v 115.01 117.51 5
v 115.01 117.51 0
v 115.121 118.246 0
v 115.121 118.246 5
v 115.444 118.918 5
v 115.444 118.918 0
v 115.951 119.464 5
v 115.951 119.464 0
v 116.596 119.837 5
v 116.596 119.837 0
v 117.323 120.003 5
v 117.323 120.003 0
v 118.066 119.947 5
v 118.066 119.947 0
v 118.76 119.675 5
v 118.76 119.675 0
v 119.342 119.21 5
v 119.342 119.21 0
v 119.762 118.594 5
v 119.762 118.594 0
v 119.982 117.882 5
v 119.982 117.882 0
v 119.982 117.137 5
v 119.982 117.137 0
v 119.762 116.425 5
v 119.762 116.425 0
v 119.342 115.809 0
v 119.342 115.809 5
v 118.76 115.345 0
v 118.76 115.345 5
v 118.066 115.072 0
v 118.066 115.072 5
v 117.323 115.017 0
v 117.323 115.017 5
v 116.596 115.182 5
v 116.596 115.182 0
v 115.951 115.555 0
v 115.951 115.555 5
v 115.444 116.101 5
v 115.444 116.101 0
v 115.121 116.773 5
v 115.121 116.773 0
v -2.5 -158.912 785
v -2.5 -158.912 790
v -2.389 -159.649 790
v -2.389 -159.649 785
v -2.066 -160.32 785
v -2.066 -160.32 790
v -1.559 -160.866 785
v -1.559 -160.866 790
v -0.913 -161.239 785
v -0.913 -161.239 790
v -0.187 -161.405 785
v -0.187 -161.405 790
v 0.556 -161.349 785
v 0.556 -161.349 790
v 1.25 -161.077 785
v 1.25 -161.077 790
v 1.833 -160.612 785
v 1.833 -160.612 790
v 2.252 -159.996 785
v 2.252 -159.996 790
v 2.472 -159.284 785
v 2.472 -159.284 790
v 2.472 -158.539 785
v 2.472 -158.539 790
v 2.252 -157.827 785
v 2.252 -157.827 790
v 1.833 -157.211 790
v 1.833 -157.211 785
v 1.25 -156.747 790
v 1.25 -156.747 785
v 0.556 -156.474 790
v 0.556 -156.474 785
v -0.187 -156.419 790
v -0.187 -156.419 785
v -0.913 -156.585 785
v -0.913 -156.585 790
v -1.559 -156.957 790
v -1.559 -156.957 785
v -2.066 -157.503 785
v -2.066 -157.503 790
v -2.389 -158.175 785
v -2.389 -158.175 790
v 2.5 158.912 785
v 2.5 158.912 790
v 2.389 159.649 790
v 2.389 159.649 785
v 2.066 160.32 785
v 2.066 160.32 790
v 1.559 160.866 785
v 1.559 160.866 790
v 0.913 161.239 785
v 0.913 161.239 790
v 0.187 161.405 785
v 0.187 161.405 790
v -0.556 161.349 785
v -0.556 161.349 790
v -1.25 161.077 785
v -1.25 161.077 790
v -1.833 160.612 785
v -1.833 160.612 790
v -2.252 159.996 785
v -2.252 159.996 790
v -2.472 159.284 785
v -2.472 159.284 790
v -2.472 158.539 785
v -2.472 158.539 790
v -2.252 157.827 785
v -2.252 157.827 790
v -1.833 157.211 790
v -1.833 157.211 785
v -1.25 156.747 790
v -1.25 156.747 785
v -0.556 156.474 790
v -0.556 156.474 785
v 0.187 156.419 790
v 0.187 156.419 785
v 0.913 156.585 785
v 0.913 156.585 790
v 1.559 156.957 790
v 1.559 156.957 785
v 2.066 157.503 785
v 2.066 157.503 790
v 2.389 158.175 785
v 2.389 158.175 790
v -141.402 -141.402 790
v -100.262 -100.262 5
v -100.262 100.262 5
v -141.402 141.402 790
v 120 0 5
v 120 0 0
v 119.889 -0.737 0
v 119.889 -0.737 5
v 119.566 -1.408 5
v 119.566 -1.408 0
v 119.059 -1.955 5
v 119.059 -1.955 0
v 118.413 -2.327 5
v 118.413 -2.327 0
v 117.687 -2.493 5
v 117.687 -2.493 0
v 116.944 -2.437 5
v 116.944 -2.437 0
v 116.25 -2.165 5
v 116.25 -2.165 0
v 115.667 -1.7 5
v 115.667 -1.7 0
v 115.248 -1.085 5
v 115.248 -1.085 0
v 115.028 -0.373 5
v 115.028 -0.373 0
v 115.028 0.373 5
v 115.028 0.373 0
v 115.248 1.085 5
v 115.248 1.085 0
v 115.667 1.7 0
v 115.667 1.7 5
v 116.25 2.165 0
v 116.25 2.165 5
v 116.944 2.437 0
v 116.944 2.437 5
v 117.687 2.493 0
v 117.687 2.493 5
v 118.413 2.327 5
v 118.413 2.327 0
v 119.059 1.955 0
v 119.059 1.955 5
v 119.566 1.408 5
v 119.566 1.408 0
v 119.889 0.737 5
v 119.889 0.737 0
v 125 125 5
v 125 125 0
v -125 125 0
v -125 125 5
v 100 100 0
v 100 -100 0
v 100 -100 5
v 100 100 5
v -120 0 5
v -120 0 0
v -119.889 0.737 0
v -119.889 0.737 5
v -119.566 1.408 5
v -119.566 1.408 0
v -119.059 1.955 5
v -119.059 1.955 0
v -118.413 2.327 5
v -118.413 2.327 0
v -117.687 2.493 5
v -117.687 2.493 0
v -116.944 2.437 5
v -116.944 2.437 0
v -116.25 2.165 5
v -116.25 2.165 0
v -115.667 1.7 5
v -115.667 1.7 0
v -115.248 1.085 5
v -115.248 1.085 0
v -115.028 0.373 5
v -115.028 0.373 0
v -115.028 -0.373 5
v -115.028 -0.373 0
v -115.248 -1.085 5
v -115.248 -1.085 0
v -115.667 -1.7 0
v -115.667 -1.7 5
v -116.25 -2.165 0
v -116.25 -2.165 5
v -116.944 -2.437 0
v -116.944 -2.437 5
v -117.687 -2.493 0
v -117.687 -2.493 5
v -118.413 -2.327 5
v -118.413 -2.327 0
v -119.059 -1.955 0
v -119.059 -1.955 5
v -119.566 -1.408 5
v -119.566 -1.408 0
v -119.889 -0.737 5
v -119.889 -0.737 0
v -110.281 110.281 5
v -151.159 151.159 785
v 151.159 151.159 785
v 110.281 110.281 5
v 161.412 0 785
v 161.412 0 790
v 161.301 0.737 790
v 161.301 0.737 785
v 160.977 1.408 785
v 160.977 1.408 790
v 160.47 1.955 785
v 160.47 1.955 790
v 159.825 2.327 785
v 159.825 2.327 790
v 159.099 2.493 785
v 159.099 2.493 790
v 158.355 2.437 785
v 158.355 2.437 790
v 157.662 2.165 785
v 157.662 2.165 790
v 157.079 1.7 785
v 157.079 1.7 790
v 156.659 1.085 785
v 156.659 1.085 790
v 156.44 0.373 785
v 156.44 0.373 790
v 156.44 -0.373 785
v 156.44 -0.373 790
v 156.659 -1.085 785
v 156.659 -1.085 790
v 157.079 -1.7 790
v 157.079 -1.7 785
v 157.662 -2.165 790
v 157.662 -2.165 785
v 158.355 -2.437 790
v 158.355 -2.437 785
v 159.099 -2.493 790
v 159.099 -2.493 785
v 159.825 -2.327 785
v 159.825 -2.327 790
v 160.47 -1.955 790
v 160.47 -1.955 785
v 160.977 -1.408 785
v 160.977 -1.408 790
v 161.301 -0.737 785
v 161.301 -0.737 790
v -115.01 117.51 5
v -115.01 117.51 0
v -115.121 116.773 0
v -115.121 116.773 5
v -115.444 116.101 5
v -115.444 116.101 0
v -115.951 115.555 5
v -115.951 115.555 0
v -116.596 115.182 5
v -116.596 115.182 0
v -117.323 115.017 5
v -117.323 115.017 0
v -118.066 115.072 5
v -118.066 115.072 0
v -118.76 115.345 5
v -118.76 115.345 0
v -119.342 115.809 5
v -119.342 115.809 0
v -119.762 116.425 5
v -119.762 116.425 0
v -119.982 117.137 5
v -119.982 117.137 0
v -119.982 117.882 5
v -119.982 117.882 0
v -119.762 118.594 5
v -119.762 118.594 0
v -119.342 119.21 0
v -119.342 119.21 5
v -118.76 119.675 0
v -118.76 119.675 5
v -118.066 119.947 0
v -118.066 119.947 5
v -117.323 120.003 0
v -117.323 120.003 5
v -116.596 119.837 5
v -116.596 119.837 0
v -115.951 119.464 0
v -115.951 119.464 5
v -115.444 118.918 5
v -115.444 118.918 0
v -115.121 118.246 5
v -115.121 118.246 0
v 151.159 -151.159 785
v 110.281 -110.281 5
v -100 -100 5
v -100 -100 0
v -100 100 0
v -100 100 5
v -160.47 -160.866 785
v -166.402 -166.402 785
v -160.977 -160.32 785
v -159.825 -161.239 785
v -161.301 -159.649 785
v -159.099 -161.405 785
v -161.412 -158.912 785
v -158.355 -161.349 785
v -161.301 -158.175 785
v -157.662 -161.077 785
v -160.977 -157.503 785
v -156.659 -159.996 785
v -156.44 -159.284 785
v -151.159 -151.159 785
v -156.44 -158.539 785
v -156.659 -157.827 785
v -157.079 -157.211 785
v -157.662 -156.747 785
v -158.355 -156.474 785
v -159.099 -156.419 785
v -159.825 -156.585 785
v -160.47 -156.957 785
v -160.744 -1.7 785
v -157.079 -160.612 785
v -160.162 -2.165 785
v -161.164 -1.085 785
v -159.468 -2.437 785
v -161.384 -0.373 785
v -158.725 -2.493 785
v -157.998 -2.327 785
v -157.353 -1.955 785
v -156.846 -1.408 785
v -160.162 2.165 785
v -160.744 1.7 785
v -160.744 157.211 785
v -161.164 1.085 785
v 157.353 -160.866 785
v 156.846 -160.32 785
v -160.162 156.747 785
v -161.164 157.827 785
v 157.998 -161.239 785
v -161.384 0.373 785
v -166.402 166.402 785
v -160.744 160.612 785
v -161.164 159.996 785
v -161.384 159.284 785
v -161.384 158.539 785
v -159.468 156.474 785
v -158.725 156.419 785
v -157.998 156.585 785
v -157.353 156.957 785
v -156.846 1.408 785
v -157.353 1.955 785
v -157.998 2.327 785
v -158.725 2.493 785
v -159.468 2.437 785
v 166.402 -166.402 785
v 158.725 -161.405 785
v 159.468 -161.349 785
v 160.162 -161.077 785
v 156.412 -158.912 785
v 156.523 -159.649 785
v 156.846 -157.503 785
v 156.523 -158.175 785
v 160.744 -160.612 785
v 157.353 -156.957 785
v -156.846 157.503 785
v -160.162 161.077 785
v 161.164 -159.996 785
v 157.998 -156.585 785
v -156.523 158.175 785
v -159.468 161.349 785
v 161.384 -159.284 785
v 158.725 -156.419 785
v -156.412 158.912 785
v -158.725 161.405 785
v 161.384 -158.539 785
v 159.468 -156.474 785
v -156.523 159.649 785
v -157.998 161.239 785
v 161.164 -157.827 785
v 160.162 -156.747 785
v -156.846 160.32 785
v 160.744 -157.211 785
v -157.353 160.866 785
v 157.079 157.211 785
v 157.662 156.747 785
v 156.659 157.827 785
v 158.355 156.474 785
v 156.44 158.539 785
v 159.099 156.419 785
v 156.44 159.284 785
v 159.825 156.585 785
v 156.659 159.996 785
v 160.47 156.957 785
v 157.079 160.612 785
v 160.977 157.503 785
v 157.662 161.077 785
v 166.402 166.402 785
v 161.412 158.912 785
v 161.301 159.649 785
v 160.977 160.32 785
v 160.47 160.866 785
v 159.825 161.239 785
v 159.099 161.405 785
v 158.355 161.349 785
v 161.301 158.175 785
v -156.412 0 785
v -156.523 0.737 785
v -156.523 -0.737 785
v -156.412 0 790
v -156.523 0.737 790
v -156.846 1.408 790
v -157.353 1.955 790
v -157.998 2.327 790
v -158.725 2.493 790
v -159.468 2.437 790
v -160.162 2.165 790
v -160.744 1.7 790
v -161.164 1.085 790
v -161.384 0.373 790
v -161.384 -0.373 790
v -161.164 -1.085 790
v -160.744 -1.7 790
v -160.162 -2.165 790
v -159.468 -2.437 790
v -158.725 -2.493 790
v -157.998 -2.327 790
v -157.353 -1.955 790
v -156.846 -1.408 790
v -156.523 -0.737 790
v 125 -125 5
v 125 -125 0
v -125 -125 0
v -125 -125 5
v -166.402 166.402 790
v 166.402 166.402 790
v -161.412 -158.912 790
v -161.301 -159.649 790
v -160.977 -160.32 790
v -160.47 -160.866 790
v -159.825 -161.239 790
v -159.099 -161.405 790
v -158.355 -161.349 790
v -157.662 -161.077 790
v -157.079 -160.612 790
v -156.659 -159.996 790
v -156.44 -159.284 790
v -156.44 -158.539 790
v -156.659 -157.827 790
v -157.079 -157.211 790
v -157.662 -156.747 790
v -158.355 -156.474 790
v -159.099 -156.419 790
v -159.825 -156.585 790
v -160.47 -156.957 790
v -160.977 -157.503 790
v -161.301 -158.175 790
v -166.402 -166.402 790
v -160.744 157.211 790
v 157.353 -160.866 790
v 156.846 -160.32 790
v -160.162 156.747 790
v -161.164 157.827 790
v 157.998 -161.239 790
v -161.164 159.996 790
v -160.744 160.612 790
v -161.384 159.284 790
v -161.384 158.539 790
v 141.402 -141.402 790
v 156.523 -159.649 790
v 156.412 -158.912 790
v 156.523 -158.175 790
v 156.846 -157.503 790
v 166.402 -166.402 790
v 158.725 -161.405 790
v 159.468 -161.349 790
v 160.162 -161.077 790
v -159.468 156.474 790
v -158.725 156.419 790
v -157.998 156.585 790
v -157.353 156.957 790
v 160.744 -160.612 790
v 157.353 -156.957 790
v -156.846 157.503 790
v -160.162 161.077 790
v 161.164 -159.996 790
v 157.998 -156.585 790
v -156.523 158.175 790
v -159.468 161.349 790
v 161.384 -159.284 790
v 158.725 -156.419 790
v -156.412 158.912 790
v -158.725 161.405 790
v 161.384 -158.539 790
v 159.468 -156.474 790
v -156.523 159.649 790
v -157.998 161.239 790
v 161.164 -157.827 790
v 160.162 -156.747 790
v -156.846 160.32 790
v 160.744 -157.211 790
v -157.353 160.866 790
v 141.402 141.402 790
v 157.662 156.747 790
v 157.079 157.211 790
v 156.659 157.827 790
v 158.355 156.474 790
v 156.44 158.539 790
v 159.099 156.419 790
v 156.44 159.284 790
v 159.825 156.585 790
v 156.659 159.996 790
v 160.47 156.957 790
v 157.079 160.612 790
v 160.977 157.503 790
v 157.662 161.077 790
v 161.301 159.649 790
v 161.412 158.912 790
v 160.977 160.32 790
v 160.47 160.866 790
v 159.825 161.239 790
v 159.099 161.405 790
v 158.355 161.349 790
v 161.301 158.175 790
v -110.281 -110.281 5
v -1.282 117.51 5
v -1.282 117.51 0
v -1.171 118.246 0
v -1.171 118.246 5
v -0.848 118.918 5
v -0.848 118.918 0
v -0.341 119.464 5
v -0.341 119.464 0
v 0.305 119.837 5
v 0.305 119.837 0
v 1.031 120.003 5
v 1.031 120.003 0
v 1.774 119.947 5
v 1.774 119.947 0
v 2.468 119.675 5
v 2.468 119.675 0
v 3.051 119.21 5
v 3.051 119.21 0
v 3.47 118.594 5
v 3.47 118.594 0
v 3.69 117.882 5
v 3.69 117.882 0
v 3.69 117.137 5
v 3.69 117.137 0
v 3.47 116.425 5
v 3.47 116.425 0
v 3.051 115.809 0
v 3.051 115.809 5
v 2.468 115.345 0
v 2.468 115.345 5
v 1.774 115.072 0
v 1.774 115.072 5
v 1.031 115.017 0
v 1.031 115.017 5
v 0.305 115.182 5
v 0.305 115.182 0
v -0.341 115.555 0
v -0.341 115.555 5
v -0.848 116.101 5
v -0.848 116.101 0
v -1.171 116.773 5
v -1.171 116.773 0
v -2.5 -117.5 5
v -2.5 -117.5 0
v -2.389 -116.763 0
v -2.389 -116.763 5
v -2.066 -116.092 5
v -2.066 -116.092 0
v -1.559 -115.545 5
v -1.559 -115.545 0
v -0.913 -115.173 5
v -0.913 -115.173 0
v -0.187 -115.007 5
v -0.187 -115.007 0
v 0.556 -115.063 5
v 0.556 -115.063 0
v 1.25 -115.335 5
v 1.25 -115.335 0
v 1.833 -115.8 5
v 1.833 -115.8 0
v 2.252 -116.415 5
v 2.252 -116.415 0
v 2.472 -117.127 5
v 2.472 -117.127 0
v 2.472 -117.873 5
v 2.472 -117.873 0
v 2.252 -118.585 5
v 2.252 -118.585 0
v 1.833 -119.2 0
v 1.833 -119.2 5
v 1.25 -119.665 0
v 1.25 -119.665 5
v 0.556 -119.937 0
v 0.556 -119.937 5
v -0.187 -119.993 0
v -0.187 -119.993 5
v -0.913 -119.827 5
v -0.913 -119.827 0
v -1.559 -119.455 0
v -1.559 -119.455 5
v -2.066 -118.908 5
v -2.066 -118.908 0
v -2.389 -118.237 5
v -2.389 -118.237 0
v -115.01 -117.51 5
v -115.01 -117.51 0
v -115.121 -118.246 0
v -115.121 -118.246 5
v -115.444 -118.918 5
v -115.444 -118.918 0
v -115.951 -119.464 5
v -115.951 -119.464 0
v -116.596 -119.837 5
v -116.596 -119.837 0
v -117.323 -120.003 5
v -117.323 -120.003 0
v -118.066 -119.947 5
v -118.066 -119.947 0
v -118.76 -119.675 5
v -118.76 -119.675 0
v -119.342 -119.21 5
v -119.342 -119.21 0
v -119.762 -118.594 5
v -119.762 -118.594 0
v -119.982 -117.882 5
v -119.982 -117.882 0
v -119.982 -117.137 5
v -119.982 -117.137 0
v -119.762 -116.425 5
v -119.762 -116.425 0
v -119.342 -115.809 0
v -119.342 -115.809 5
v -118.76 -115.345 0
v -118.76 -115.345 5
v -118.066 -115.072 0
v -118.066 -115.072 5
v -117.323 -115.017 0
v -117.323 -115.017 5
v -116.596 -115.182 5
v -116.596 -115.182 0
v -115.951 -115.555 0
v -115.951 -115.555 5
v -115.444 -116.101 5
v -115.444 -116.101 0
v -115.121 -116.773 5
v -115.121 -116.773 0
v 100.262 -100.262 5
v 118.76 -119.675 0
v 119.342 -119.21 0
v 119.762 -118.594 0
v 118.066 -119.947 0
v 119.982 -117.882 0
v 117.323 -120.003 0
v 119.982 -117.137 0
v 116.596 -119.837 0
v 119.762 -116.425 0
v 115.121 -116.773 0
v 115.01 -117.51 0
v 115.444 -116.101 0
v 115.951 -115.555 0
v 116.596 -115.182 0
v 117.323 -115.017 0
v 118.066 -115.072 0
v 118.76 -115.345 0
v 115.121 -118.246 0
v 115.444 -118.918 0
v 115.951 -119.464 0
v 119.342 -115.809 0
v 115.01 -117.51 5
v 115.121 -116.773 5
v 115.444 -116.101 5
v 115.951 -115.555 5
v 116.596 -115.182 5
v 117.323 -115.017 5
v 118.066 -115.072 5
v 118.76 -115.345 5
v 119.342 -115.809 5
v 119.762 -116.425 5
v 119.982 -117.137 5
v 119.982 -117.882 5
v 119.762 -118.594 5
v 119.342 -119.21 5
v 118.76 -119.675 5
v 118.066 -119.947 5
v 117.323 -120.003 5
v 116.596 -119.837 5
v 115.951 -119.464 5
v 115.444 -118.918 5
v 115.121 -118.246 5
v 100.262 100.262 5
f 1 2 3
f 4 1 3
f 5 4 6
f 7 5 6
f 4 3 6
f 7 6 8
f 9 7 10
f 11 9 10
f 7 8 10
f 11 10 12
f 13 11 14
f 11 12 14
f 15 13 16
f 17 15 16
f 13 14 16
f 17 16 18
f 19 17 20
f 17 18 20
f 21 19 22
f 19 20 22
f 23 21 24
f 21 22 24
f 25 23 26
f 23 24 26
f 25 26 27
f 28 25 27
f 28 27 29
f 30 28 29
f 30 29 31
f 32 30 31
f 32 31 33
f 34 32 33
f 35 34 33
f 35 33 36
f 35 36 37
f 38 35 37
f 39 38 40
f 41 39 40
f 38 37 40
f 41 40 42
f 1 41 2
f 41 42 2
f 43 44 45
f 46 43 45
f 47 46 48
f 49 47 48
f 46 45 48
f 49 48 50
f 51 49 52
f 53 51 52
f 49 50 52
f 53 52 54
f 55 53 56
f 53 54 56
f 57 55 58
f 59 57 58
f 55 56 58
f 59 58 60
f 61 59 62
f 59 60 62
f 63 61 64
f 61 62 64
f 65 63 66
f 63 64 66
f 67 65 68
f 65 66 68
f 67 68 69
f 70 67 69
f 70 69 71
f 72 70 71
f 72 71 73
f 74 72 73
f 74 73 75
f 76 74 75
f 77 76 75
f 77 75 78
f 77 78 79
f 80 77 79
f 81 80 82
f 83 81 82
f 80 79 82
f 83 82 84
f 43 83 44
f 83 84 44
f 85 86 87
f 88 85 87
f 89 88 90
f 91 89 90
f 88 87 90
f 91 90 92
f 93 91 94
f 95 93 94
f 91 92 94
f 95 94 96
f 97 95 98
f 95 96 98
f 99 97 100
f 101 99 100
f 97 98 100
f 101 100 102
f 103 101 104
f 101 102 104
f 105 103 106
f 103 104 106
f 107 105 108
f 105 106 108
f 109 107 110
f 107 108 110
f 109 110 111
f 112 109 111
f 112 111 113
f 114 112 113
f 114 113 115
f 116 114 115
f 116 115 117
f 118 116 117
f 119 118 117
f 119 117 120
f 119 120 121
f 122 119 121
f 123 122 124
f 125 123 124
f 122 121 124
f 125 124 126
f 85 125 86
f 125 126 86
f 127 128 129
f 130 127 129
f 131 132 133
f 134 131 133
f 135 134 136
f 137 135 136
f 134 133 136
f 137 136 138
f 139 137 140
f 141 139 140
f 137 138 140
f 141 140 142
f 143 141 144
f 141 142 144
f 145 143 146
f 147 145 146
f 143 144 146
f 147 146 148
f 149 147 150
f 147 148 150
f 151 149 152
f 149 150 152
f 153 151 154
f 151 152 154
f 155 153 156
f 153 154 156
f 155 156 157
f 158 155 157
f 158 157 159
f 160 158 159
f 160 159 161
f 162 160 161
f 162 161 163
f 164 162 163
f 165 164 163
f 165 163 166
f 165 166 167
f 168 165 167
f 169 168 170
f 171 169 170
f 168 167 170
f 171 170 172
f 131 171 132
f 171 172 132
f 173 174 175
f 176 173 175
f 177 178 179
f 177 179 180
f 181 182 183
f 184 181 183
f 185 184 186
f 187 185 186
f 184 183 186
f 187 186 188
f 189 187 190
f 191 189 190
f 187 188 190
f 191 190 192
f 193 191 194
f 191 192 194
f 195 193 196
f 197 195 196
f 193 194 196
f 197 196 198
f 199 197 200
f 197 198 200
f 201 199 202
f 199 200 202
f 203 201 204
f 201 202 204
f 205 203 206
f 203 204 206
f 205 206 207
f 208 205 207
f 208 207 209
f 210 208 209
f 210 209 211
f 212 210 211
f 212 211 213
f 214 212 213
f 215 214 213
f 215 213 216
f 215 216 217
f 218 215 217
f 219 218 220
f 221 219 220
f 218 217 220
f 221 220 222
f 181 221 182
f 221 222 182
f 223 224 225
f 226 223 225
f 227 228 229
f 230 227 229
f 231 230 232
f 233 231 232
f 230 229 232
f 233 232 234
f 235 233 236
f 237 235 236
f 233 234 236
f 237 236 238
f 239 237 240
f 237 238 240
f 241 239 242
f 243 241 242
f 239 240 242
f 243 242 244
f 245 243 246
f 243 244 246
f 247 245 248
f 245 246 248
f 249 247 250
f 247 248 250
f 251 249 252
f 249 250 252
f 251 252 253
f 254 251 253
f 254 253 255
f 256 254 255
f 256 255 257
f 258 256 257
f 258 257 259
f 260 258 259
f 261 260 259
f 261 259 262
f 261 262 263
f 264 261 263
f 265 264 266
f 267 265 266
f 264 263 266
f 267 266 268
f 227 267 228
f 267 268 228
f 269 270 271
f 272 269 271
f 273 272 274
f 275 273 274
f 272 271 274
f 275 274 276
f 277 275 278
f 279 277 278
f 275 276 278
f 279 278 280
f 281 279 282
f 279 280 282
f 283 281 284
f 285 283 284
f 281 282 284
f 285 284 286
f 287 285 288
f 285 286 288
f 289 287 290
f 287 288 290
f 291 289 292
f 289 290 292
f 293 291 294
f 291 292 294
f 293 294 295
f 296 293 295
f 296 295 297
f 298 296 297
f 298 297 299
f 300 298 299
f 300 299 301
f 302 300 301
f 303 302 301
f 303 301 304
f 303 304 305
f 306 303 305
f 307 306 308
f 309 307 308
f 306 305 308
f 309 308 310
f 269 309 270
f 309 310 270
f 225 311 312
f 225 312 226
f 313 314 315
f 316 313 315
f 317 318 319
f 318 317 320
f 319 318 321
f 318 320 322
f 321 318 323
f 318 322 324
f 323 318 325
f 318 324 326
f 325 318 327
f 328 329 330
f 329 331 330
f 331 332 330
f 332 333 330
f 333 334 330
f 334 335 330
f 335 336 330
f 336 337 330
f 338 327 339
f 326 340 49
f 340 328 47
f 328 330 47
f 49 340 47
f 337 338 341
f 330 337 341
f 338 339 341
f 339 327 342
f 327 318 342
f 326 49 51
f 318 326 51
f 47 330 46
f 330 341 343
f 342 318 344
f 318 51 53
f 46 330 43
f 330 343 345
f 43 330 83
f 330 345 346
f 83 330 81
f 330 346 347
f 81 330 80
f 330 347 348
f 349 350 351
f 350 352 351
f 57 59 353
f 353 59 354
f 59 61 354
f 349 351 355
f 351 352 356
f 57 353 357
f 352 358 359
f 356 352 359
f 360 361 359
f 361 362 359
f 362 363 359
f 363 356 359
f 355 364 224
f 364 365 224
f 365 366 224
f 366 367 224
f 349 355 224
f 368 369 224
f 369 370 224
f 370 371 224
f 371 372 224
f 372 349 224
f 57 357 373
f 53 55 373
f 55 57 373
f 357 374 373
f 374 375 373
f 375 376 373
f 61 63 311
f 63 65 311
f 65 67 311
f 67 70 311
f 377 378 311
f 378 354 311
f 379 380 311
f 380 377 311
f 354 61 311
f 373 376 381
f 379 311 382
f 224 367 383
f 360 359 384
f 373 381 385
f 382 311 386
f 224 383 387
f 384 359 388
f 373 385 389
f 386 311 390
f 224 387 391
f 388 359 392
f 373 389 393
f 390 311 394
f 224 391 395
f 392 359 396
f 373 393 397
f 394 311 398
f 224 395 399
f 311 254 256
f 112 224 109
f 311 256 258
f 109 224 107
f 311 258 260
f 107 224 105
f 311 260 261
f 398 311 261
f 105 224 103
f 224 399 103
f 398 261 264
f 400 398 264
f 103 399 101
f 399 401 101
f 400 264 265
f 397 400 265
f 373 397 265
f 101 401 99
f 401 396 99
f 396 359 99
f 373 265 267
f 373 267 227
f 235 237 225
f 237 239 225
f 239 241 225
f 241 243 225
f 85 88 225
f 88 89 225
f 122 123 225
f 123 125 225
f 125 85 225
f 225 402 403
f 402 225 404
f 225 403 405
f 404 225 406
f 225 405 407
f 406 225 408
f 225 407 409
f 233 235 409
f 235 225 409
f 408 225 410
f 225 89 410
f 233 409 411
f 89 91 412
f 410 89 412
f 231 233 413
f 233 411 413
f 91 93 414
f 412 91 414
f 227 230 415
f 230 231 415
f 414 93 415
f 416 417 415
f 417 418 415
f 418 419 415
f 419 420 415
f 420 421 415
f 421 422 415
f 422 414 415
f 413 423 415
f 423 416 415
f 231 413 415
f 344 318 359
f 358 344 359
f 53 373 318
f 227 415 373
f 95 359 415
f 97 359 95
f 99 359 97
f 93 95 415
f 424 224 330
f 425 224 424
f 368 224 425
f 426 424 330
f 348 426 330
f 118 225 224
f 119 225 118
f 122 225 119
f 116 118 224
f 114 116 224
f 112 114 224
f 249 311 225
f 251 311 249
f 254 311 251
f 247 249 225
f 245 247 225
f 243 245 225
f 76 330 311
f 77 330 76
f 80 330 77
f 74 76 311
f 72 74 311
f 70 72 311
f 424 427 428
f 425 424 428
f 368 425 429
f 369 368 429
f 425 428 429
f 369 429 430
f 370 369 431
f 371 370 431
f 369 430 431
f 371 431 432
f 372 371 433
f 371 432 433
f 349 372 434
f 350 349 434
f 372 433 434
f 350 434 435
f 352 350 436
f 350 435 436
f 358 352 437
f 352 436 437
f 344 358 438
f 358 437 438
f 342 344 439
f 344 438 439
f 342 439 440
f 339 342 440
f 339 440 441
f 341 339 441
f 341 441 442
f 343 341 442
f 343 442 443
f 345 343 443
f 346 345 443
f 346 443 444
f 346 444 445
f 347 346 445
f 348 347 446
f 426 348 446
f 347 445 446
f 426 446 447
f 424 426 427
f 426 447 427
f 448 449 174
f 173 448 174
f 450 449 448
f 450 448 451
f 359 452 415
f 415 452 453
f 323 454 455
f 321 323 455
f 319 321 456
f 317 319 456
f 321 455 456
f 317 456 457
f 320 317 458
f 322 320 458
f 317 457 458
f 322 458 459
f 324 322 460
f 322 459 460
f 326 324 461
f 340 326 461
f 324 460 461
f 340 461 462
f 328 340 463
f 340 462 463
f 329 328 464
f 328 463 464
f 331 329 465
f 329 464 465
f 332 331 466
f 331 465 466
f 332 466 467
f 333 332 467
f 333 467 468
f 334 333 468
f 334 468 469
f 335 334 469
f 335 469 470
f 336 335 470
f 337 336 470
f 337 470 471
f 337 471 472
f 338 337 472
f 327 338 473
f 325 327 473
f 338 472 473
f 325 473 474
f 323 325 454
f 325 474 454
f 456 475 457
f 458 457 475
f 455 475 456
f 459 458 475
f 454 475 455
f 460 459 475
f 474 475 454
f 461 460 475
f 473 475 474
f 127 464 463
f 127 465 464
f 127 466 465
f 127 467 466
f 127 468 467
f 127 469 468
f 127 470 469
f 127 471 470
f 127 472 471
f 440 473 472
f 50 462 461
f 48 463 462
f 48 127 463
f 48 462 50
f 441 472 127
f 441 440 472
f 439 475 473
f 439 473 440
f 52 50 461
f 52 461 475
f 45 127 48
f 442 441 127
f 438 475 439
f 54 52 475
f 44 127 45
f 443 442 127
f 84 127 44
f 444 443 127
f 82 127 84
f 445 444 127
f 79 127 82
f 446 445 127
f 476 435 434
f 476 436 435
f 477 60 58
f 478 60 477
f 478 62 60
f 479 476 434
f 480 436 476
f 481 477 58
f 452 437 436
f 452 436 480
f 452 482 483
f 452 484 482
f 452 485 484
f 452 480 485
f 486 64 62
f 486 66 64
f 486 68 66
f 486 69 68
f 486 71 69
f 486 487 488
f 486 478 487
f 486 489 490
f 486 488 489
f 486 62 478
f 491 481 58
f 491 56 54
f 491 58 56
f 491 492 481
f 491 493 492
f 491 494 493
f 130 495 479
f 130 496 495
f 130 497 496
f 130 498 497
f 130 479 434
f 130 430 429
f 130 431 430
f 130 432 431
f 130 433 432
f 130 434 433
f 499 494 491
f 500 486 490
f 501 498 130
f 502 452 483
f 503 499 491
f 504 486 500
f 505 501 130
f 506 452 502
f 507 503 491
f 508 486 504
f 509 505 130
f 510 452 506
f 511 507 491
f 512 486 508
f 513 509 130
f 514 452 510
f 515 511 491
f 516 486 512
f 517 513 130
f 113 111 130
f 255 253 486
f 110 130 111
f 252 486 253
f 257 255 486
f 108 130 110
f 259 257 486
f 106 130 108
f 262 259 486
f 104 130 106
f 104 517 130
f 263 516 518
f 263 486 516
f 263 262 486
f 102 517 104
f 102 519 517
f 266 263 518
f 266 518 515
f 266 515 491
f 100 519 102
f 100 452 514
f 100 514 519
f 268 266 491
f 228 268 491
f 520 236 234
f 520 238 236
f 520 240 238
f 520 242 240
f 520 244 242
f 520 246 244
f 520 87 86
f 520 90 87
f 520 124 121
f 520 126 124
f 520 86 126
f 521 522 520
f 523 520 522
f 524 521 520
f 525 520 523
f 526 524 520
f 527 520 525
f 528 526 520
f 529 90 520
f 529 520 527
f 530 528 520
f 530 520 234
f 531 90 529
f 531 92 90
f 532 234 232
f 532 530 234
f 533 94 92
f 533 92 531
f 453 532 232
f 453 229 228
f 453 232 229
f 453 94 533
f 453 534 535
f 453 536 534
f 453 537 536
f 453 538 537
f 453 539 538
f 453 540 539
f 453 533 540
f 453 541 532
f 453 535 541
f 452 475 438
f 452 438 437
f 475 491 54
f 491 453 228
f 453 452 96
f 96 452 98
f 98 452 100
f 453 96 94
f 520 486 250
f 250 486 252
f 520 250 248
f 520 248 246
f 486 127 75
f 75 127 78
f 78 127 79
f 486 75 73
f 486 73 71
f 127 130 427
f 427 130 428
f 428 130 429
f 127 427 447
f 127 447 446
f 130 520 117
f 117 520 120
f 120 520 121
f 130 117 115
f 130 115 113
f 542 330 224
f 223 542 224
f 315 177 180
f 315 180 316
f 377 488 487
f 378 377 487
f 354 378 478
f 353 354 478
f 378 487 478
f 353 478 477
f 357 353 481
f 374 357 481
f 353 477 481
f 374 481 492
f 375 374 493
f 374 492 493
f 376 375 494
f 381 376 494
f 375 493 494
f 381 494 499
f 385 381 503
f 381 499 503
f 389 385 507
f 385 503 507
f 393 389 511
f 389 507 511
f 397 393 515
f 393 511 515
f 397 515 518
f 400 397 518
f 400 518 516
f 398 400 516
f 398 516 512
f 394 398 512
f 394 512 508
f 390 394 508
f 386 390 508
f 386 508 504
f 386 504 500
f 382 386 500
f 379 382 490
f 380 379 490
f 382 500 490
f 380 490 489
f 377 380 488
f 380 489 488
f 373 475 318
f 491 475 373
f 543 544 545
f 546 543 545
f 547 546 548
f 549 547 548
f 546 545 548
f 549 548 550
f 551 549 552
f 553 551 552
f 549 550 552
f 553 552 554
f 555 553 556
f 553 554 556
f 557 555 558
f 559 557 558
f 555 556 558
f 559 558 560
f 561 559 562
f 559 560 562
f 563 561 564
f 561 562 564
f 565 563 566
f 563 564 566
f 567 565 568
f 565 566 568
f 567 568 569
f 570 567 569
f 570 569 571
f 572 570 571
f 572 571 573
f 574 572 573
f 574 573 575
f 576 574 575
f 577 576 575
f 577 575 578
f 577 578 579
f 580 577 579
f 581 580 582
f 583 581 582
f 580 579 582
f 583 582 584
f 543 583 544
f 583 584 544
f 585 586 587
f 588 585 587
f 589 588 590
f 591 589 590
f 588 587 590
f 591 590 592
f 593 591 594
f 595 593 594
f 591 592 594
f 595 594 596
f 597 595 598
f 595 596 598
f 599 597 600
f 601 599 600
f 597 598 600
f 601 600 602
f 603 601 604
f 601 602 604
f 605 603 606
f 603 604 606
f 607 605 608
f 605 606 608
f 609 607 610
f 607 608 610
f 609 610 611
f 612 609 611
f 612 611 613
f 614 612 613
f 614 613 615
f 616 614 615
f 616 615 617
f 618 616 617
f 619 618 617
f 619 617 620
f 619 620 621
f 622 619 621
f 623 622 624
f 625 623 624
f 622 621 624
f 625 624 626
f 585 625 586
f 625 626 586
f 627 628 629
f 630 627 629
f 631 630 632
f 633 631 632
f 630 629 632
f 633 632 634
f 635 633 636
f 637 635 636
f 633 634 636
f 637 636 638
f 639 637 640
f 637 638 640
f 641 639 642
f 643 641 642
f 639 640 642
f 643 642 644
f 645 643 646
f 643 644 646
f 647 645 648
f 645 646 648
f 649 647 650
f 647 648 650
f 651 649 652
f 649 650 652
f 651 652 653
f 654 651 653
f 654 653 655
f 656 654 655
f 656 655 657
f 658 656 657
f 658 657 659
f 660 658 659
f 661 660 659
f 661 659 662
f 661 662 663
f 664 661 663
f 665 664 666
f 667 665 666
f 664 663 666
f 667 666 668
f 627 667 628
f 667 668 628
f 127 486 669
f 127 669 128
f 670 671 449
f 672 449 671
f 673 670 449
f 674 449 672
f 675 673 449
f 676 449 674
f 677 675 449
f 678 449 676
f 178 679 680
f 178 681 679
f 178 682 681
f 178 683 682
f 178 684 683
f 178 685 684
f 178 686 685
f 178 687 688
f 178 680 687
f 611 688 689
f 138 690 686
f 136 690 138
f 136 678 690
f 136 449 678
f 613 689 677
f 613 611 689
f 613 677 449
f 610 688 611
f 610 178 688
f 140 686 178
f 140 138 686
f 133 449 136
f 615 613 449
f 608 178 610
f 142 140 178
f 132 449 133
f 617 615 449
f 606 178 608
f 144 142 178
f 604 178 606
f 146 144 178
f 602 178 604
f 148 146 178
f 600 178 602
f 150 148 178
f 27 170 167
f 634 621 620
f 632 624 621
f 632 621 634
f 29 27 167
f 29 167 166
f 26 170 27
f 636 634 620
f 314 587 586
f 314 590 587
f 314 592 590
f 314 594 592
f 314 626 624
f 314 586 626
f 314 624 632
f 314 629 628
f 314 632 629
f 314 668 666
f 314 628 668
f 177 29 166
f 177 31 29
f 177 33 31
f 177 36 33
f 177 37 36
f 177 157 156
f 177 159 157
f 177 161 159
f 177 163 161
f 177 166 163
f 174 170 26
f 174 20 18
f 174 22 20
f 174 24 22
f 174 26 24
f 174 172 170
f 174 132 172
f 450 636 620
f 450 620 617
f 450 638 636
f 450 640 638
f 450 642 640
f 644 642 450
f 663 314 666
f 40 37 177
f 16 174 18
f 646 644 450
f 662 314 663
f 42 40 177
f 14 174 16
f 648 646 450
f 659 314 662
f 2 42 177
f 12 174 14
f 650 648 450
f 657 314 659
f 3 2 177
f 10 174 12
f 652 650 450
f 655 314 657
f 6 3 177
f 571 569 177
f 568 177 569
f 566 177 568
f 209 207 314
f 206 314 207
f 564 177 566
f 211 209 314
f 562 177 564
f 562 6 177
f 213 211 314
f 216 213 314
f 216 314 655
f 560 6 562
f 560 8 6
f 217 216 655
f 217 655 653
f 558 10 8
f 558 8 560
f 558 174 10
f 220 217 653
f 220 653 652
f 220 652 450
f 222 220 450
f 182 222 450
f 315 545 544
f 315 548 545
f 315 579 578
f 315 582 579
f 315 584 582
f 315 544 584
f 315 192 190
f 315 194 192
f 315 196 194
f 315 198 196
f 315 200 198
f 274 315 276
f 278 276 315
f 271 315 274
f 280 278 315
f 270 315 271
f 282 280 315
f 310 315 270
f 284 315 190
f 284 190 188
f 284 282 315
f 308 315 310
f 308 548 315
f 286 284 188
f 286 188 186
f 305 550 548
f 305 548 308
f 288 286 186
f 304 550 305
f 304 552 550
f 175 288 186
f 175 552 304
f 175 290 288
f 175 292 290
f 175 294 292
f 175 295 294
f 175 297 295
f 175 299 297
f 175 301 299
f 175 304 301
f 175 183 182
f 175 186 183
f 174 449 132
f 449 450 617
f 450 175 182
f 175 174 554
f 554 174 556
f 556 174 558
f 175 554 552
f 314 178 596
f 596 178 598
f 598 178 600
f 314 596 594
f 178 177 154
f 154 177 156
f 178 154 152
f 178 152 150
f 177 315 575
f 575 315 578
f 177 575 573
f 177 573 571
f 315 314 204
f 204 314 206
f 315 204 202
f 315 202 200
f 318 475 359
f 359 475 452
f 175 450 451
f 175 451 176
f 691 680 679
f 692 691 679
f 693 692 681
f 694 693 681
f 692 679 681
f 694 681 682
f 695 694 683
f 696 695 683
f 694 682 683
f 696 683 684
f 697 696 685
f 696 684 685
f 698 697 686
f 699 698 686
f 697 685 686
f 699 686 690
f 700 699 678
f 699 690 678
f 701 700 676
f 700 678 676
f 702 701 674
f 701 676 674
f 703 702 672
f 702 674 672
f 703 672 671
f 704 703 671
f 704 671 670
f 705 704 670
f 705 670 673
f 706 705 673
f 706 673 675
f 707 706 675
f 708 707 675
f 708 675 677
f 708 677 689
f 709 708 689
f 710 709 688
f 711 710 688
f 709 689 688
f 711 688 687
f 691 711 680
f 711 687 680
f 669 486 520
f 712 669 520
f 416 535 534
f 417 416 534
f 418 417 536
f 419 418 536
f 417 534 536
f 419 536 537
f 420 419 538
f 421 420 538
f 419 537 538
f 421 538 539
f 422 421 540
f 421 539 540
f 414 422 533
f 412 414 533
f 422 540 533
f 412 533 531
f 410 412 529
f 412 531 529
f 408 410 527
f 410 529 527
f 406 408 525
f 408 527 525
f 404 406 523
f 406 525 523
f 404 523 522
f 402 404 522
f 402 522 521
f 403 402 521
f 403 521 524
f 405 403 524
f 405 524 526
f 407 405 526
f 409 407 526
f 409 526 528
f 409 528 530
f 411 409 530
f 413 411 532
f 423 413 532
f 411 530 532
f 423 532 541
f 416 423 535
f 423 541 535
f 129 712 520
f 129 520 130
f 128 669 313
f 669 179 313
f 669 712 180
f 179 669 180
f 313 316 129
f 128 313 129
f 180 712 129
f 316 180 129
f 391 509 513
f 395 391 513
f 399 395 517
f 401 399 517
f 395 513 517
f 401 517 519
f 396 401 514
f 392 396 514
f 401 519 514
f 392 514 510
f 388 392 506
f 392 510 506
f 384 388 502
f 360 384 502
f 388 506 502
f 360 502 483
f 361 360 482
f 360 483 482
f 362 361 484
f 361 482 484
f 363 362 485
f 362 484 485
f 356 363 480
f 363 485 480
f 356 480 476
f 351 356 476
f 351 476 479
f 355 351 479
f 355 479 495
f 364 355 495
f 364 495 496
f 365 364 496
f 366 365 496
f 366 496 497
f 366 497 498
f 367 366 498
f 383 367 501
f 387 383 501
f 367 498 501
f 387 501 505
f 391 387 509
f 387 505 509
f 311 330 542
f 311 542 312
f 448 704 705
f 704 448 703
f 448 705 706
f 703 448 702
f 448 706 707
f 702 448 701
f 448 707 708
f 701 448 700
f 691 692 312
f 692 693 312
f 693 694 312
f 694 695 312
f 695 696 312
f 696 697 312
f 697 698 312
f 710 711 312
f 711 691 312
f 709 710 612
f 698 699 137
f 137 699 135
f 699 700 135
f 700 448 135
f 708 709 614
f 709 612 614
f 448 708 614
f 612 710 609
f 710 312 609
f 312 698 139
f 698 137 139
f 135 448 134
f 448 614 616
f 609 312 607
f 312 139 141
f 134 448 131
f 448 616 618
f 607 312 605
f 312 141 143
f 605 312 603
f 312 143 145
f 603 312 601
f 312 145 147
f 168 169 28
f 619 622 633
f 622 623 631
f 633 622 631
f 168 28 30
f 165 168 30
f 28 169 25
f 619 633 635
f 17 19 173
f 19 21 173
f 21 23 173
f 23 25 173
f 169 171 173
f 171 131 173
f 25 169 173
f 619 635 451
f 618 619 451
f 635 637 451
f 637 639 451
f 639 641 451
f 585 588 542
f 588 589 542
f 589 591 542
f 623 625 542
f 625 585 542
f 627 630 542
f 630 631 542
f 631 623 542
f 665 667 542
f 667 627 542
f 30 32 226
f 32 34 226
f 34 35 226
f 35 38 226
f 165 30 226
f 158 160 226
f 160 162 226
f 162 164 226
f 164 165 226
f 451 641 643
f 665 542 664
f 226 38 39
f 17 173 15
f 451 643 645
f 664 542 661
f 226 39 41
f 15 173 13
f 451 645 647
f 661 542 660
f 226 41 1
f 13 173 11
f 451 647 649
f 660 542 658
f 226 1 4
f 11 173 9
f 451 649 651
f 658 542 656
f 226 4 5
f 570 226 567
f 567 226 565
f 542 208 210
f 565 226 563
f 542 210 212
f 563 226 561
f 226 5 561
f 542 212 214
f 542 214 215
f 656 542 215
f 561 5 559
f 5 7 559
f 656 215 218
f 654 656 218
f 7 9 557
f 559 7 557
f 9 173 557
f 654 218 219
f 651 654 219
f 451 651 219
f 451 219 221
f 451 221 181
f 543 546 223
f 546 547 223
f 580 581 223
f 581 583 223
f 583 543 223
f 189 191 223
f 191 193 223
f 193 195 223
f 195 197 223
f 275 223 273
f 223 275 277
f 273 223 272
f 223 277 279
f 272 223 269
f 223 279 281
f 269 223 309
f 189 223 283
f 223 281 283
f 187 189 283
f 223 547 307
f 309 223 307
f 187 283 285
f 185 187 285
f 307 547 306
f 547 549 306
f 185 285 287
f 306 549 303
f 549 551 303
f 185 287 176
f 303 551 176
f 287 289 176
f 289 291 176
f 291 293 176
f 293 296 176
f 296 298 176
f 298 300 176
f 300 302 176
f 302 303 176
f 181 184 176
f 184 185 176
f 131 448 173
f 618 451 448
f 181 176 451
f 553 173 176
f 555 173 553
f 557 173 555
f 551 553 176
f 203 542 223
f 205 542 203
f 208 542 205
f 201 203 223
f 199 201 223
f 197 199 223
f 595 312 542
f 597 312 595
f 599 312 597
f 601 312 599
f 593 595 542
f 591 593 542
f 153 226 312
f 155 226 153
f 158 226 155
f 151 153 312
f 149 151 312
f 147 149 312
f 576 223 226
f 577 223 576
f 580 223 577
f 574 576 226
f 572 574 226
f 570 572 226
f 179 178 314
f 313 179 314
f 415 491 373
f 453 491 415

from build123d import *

# Parameters (mm, degrees)
SKETCH3_W           = 302.8427
SKETCH3_H           = 302.8427
BOSS_EXTRUDE1_DEPTH = 790
BOSS_EXTRUDE1_DRAFT = -3
SKETCH6_W           = 200
SKETCH6_H           = 200
CUT_EXTRUDE3_DEPTH  = 790
CUT_EXTRUDE3_DRAFT  = 3
SKETCH7_W           = 250
SKETCH7_H           = 250
SKETCH7_R           = 2.5
SKETCH7_W_2         = 200
SKETCH7_H_2         = 200
BOSS_EXTRUDE2_DEPTH = 5
SKETCH8_W           = 332.804291268
SKETCH8_H           = 332.804291268
SKETCH8_R           = 2.5
SKETCH8_W_2         = 282.804291268
SKETCH8_H_2         = 282.804291268
BOSS_EXTRUDE3_DEPTH = 5


with BuildPart() as part:
    # Sketch3 → Boss-Extrude1 (with draft: the straight prism first)
    with BuildSketch(Plane.XY.offset(790)):
        Rectangle(SKETCH3_W, SKETCH3_H)
    extrude(amount=-BOSS_EXTRUDE1_DEPTH)
    # Boss-Extrude1: the draft: its side faces are tilted about the plane it starts from
    boss_extrude1_sides = [part.faces().sort_by_distance(p)[0] for p in [
        (0, 151.42135, 395),
        (-151.42135, 0, 395),
        (0, -151.42135, 395),
        (151.42135, 0, 395),
    ]]
    draft(boss_extrude1_sides, Plane.XY.offset(790), BOSS_EXTRUDE1_DRAFT)


with BuildPart() as cut_extrude3_tool:
    # Sketch6 → Cut-Extrude3 (with draft: the straight prism first)
    with BuildSketch(Plane(origin=(0, 0, 0), x_dir=(-1, 0, 0), z_dir=(0, 0, -1))):
        Rectangle(SKETCH6_W, SKETCH6_H)
    extrude(amount=-CUT_EXTRUDE3_DEPTH)
    # Cut-Extrude3: the draft: its side faces are tilted about the plane it starts from
    cut_extrude3_sides = [cut_extrude3_tool.faces().sort_by_distance(p)[0] for p in [
        (0, -100, 395),
        (-100, 0, 395),
        (0, 100, 395),
        (100, 0, 395),
    ]]
    draft(cut_extrude3_sides, Plane(origin=(0, 0, 0), x_dir=(-1, 0, 0), z_dir=(0, 0, -1)), CUT_EXTRUDE3_DRAFT)


with BuildPart() as part_1:
    add(part.part)

    # Cut-Extrude3: cut by cut_extrude3_tool
    add(cut_extrude3_tool.part, mode=Mode.SUBTRACT)

    # Sketch7 → Boss-Extrude2 (add)
    with BuildSketch(Plane(origin=(0, 0, 0), x_dir=(-1, 0, 0), z_dir=(0, 0, -1))):
        Rectangle(SKETCH7_W, SKETCH7_H)
        with Locations((0, -117.5)):
            Circle(SKETCH7_R, mode=Mode.SUBTRACT)
        with Locations((-117.509602183, 117.509602183)):
            Circle(SKETCH7_R, mode=Mode.SUBTRACT)
        with Locations(Location((117.509602183, -117.509602183, 0), (0, 0, 180))):
            Circle(SKETCH7_R, mode=Mode.SUBTRACT)
        with Locations(Location((-117.5, 0, 0), (0, 0, 180))):
            Circle(SKETCH7_R, mode=Mode.SUBTRACT)
        with Locations((-117.509602183, -117.509602183)):
            Circle(SKETCH7_R, mode=Mode.SUBTRACT)
        with Locations(Location((117.509602183, 117.509602183, 0), (0, 0, 180))):
            Circle(SKETCH7_R, mode=Mode.SUBTRACT)
        with Locations((117.5, 0)):
            Circle(SKETCH7_R, mode=Mode.SUBTRACT)
        with Locations((-1.21803637, 117.509602183)):
            Circle(SKETCH7_R, mode=Mode.SUBTRACT)
        Rectangle(SKETCH7_W_2, SKETCH7_H_2, mode=Mode.SUBTRACT)
    extrude(amount=-BOSS_EXTRUDE2_DEPTH)

    # Sketch8 → Boss-Extrude3 (add)
    with BuildSketch(Plane.XY.offset(790)):
        Rectangle(SKETCH8_W, SKETCH8_H)
        with Locations((-158.911747817, 0)):
            Circle(SKETCH8_R, mode=Mode.SUBTRACT)
        with Locations((-158.911747817, 158.911747817)):
            Circle(SKETCH8_R, mode=Mode.SUBTRACT)
        with Locations(Location((158.911747817, -158.911747817, 0), (0, 0, 180))):
            Circle(SKETCH8_R, mode=Mode.SUBTRACT)
        with Locations(Location((0, -158.911747817, 0), (0, 0, 180))):
            Circle(SKETCH8_R, mode=Mode.SUBTRACT)
        with Locations((158.911747817, 158.911747817)):
            Circle(SKETCH8_R, mode=Mode.SUBTRACT)
        with Locations((0, 158.911747817)):
            Circle(SKETCH8_R, mode=Mode.SUBTRACT)
        with Locations(Location((-158.911747817, -158.911747817, 0), (0, 0, 180))):
            Circle(SKETCH8_R, mode=Mode.SUBTRACT)
        with Locations((158.911747817, 0)):
            Circle(SKETCH8_R, mode=Mode.SUBTRACT)
        Rectangle(SKETCH8_W_2, SKETCH8_H_2, mode=Mode.SUBTRACT)
    extrude(amount=-BOSS_EXTRUDE3_DEPTH)


solid = part_1.part
